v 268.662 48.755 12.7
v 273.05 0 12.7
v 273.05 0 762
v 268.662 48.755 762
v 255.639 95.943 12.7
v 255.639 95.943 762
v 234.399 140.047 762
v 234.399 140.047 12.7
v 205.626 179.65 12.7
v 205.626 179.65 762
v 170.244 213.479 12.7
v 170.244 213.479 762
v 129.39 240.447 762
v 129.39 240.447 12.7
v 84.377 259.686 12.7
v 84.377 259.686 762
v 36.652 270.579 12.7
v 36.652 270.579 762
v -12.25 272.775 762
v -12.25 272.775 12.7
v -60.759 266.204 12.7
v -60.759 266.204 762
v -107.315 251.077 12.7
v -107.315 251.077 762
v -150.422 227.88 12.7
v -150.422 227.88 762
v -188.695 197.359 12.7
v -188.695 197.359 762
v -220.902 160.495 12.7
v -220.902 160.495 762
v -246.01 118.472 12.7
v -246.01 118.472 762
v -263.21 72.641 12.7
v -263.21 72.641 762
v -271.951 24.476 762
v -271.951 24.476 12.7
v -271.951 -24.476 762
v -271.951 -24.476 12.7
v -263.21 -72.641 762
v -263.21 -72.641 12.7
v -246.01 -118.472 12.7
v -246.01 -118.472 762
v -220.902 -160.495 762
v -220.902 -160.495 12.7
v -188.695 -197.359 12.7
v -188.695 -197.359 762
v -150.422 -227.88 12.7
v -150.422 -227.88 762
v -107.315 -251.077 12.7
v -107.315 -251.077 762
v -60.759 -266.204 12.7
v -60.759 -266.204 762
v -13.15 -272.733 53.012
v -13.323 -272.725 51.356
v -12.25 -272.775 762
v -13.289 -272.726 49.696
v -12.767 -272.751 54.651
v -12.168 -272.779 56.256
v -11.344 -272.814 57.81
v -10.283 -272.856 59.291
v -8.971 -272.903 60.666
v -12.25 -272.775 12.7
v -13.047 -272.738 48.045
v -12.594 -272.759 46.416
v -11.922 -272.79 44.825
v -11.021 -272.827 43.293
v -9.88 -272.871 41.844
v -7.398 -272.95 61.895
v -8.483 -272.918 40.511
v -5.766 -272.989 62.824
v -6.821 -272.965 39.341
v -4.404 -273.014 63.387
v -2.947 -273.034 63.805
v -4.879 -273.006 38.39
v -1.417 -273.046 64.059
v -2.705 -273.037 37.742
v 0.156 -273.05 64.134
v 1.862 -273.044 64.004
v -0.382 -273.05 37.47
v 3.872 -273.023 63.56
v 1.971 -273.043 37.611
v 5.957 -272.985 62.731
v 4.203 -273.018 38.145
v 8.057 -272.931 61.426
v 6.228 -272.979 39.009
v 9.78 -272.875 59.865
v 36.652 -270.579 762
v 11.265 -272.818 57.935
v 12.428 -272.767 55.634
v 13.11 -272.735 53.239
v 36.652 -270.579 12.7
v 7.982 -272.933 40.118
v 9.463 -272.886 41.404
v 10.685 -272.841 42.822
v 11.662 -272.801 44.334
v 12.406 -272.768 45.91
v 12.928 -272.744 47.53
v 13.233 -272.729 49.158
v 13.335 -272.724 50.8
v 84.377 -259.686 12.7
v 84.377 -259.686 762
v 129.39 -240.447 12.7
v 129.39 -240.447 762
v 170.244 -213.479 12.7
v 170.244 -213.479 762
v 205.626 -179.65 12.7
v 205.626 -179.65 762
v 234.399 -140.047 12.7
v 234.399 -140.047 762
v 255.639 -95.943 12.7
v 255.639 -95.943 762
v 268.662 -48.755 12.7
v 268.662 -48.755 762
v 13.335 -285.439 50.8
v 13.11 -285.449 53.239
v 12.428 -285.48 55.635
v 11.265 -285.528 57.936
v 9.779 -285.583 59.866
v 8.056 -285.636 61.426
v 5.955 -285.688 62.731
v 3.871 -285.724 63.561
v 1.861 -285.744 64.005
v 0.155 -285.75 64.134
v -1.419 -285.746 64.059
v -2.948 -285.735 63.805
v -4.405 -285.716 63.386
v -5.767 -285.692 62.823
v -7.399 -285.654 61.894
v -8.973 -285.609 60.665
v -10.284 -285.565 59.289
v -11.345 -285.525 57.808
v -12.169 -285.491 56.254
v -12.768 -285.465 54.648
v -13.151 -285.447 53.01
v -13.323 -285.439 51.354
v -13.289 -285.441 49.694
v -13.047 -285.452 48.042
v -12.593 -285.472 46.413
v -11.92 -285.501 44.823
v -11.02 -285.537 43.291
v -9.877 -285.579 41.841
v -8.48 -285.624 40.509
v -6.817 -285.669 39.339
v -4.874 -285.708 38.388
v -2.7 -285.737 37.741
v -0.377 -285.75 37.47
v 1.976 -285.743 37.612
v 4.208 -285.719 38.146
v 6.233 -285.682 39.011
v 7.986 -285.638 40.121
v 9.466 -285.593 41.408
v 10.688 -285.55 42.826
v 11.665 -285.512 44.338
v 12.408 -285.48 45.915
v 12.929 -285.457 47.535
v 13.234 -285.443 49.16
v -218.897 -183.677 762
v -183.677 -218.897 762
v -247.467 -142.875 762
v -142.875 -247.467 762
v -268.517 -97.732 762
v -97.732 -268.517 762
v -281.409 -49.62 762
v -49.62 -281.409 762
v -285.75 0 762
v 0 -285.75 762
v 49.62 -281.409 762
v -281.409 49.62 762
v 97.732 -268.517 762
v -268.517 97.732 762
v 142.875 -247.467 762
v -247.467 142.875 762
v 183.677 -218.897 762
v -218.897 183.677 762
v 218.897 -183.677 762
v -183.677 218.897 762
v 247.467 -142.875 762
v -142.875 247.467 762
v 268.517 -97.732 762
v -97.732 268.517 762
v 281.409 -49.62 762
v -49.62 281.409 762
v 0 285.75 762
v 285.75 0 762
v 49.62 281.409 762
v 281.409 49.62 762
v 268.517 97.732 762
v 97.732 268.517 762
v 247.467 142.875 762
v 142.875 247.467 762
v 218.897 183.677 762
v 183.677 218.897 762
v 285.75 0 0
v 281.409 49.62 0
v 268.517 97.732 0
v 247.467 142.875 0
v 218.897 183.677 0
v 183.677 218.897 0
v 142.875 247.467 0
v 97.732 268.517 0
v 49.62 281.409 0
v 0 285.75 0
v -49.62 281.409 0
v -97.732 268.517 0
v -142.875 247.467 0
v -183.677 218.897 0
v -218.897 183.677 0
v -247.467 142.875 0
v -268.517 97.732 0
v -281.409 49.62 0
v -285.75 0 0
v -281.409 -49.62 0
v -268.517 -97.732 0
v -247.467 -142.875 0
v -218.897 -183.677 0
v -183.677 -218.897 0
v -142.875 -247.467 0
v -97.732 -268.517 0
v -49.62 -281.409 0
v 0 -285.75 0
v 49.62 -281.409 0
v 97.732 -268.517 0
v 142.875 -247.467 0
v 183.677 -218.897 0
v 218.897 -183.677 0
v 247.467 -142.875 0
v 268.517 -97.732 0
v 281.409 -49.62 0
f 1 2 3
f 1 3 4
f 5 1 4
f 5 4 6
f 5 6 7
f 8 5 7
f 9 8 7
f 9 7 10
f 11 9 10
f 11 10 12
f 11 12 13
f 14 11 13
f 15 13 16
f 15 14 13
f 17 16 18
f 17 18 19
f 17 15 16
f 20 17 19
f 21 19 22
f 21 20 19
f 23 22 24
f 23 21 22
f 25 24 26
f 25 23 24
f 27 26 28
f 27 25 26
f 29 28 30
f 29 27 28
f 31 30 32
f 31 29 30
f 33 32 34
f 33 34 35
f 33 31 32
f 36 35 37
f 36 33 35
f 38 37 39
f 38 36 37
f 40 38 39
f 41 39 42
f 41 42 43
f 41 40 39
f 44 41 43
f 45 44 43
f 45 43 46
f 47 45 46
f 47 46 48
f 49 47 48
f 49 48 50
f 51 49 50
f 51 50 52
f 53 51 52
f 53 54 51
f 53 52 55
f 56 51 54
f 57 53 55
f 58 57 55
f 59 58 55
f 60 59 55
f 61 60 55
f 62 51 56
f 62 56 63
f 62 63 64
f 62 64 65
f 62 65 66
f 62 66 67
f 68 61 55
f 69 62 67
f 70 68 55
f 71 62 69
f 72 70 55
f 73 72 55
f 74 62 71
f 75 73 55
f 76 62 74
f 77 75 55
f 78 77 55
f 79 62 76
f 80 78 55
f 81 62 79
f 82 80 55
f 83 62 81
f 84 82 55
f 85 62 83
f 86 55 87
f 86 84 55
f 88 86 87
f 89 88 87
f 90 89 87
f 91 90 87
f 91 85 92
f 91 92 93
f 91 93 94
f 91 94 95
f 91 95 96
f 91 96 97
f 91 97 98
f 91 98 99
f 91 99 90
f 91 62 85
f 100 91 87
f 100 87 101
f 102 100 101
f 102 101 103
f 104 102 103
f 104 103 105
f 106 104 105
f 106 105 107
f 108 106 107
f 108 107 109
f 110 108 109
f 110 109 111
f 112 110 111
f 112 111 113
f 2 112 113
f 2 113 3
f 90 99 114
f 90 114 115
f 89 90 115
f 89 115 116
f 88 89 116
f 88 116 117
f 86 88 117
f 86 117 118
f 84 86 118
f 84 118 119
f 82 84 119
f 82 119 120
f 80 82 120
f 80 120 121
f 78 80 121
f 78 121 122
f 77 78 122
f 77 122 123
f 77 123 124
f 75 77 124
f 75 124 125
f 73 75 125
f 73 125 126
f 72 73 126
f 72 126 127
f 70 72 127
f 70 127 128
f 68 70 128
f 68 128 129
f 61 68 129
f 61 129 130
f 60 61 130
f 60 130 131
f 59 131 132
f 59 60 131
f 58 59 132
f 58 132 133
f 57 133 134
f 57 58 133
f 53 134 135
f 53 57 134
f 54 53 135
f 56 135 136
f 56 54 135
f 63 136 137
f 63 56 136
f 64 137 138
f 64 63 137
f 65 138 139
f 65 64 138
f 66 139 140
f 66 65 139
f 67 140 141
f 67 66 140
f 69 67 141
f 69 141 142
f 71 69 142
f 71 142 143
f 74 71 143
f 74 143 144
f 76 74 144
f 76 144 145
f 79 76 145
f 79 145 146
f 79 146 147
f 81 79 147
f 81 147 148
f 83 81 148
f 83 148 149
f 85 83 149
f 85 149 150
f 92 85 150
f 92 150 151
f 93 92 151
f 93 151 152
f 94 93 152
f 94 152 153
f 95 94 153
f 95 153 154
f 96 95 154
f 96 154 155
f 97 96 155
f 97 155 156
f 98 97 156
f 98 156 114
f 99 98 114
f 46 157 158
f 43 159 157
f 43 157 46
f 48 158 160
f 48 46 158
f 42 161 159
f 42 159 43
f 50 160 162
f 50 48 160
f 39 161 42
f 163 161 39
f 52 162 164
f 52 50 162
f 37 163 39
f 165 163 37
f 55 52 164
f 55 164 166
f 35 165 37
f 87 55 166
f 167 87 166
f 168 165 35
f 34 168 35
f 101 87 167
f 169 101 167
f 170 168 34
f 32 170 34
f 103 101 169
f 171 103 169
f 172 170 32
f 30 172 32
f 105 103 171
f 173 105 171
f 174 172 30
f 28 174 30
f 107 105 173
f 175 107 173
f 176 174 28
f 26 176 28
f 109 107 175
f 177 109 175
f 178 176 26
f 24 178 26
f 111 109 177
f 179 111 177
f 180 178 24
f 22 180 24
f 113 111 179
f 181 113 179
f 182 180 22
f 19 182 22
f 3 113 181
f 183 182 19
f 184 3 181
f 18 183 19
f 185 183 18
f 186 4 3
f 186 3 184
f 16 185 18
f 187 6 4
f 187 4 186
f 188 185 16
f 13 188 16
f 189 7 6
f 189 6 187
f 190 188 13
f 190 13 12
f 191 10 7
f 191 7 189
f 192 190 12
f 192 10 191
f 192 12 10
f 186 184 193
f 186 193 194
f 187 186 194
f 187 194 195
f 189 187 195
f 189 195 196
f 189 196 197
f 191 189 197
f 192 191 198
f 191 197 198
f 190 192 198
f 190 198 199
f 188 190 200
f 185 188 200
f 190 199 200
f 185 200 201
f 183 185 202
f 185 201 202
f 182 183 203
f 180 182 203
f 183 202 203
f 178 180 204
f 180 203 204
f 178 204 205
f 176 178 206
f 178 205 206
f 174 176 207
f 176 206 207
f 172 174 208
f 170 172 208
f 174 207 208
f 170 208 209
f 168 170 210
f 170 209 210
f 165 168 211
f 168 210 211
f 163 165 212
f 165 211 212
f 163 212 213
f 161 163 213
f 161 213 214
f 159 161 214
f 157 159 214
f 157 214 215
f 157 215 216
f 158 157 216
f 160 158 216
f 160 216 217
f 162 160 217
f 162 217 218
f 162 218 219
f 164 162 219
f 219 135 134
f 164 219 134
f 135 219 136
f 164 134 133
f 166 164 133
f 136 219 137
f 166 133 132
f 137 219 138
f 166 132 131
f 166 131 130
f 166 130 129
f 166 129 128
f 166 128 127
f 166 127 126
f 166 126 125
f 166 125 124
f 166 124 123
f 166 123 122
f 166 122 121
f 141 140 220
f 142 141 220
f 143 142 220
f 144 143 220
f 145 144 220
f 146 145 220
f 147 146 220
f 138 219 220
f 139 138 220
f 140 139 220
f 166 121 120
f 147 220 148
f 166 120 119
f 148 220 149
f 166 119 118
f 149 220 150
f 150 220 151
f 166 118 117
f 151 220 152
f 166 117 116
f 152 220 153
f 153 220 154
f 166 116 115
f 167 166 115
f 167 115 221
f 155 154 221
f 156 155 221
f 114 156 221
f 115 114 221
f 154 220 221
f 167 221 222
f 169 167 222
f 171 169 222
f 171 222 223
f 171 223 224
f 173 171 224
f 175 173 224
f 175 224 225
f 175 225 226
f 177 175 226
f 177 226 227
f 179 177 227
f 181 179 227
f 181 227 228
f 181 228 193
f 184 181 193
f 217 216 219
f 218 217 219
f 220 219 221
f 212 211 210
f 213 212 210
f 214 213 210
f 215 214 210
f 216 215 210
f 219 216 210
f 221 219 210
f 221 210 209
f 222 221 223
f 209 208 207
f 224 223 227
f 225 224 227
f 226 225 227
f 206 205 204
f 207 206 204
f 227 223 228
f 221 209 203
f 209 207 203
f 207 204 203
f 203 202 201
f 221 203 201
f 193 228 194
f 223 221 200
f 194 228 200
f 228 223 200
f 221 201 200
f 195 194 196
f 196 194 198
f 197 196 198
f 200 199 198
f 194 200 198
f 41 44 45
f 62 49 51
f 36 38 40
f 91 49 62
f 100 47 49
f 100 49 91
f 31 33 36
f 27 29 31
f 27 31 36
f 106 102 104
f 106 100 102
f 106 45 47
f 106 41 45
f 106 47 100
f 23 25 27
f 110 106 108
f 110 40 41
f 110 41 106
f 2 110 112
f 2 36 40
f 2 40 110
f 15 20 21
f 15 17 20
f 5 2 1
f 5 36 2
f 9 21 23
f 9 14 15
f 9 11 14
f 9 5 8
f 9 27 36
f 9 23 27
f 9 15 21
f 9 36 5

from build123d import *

# Parameters (mm, degrees)
F0_R     = 285.75
F1_DEPTH = 762
F2_T     = -12.7
F3_R     = 13.335
F4_DEPTH = 327.66


with BuildPart() as f1:
    # F0 (on Top) → F1 (new body)
    with BuildSketch(Plane.XY):
        Circle(F0_R)
    extrude(amount=F1_DEPTH)

    # F2
    f2_openings = [f1.faces().sort_by_distance(p)[0] for p in [
        (0, 0, 762),
    ]]
    offset(amount=F2_T, openings=f2_openings)

    # F3 (on Front) → F4 (cut)
    with BuildSketch(Plane.XZ):
        with Locations((0, 50.8)):
            Circle(F3_R)
    extrude(amount=F4_DEPTH, mode=Mode.SUBTRACT)


solid = f1.part
